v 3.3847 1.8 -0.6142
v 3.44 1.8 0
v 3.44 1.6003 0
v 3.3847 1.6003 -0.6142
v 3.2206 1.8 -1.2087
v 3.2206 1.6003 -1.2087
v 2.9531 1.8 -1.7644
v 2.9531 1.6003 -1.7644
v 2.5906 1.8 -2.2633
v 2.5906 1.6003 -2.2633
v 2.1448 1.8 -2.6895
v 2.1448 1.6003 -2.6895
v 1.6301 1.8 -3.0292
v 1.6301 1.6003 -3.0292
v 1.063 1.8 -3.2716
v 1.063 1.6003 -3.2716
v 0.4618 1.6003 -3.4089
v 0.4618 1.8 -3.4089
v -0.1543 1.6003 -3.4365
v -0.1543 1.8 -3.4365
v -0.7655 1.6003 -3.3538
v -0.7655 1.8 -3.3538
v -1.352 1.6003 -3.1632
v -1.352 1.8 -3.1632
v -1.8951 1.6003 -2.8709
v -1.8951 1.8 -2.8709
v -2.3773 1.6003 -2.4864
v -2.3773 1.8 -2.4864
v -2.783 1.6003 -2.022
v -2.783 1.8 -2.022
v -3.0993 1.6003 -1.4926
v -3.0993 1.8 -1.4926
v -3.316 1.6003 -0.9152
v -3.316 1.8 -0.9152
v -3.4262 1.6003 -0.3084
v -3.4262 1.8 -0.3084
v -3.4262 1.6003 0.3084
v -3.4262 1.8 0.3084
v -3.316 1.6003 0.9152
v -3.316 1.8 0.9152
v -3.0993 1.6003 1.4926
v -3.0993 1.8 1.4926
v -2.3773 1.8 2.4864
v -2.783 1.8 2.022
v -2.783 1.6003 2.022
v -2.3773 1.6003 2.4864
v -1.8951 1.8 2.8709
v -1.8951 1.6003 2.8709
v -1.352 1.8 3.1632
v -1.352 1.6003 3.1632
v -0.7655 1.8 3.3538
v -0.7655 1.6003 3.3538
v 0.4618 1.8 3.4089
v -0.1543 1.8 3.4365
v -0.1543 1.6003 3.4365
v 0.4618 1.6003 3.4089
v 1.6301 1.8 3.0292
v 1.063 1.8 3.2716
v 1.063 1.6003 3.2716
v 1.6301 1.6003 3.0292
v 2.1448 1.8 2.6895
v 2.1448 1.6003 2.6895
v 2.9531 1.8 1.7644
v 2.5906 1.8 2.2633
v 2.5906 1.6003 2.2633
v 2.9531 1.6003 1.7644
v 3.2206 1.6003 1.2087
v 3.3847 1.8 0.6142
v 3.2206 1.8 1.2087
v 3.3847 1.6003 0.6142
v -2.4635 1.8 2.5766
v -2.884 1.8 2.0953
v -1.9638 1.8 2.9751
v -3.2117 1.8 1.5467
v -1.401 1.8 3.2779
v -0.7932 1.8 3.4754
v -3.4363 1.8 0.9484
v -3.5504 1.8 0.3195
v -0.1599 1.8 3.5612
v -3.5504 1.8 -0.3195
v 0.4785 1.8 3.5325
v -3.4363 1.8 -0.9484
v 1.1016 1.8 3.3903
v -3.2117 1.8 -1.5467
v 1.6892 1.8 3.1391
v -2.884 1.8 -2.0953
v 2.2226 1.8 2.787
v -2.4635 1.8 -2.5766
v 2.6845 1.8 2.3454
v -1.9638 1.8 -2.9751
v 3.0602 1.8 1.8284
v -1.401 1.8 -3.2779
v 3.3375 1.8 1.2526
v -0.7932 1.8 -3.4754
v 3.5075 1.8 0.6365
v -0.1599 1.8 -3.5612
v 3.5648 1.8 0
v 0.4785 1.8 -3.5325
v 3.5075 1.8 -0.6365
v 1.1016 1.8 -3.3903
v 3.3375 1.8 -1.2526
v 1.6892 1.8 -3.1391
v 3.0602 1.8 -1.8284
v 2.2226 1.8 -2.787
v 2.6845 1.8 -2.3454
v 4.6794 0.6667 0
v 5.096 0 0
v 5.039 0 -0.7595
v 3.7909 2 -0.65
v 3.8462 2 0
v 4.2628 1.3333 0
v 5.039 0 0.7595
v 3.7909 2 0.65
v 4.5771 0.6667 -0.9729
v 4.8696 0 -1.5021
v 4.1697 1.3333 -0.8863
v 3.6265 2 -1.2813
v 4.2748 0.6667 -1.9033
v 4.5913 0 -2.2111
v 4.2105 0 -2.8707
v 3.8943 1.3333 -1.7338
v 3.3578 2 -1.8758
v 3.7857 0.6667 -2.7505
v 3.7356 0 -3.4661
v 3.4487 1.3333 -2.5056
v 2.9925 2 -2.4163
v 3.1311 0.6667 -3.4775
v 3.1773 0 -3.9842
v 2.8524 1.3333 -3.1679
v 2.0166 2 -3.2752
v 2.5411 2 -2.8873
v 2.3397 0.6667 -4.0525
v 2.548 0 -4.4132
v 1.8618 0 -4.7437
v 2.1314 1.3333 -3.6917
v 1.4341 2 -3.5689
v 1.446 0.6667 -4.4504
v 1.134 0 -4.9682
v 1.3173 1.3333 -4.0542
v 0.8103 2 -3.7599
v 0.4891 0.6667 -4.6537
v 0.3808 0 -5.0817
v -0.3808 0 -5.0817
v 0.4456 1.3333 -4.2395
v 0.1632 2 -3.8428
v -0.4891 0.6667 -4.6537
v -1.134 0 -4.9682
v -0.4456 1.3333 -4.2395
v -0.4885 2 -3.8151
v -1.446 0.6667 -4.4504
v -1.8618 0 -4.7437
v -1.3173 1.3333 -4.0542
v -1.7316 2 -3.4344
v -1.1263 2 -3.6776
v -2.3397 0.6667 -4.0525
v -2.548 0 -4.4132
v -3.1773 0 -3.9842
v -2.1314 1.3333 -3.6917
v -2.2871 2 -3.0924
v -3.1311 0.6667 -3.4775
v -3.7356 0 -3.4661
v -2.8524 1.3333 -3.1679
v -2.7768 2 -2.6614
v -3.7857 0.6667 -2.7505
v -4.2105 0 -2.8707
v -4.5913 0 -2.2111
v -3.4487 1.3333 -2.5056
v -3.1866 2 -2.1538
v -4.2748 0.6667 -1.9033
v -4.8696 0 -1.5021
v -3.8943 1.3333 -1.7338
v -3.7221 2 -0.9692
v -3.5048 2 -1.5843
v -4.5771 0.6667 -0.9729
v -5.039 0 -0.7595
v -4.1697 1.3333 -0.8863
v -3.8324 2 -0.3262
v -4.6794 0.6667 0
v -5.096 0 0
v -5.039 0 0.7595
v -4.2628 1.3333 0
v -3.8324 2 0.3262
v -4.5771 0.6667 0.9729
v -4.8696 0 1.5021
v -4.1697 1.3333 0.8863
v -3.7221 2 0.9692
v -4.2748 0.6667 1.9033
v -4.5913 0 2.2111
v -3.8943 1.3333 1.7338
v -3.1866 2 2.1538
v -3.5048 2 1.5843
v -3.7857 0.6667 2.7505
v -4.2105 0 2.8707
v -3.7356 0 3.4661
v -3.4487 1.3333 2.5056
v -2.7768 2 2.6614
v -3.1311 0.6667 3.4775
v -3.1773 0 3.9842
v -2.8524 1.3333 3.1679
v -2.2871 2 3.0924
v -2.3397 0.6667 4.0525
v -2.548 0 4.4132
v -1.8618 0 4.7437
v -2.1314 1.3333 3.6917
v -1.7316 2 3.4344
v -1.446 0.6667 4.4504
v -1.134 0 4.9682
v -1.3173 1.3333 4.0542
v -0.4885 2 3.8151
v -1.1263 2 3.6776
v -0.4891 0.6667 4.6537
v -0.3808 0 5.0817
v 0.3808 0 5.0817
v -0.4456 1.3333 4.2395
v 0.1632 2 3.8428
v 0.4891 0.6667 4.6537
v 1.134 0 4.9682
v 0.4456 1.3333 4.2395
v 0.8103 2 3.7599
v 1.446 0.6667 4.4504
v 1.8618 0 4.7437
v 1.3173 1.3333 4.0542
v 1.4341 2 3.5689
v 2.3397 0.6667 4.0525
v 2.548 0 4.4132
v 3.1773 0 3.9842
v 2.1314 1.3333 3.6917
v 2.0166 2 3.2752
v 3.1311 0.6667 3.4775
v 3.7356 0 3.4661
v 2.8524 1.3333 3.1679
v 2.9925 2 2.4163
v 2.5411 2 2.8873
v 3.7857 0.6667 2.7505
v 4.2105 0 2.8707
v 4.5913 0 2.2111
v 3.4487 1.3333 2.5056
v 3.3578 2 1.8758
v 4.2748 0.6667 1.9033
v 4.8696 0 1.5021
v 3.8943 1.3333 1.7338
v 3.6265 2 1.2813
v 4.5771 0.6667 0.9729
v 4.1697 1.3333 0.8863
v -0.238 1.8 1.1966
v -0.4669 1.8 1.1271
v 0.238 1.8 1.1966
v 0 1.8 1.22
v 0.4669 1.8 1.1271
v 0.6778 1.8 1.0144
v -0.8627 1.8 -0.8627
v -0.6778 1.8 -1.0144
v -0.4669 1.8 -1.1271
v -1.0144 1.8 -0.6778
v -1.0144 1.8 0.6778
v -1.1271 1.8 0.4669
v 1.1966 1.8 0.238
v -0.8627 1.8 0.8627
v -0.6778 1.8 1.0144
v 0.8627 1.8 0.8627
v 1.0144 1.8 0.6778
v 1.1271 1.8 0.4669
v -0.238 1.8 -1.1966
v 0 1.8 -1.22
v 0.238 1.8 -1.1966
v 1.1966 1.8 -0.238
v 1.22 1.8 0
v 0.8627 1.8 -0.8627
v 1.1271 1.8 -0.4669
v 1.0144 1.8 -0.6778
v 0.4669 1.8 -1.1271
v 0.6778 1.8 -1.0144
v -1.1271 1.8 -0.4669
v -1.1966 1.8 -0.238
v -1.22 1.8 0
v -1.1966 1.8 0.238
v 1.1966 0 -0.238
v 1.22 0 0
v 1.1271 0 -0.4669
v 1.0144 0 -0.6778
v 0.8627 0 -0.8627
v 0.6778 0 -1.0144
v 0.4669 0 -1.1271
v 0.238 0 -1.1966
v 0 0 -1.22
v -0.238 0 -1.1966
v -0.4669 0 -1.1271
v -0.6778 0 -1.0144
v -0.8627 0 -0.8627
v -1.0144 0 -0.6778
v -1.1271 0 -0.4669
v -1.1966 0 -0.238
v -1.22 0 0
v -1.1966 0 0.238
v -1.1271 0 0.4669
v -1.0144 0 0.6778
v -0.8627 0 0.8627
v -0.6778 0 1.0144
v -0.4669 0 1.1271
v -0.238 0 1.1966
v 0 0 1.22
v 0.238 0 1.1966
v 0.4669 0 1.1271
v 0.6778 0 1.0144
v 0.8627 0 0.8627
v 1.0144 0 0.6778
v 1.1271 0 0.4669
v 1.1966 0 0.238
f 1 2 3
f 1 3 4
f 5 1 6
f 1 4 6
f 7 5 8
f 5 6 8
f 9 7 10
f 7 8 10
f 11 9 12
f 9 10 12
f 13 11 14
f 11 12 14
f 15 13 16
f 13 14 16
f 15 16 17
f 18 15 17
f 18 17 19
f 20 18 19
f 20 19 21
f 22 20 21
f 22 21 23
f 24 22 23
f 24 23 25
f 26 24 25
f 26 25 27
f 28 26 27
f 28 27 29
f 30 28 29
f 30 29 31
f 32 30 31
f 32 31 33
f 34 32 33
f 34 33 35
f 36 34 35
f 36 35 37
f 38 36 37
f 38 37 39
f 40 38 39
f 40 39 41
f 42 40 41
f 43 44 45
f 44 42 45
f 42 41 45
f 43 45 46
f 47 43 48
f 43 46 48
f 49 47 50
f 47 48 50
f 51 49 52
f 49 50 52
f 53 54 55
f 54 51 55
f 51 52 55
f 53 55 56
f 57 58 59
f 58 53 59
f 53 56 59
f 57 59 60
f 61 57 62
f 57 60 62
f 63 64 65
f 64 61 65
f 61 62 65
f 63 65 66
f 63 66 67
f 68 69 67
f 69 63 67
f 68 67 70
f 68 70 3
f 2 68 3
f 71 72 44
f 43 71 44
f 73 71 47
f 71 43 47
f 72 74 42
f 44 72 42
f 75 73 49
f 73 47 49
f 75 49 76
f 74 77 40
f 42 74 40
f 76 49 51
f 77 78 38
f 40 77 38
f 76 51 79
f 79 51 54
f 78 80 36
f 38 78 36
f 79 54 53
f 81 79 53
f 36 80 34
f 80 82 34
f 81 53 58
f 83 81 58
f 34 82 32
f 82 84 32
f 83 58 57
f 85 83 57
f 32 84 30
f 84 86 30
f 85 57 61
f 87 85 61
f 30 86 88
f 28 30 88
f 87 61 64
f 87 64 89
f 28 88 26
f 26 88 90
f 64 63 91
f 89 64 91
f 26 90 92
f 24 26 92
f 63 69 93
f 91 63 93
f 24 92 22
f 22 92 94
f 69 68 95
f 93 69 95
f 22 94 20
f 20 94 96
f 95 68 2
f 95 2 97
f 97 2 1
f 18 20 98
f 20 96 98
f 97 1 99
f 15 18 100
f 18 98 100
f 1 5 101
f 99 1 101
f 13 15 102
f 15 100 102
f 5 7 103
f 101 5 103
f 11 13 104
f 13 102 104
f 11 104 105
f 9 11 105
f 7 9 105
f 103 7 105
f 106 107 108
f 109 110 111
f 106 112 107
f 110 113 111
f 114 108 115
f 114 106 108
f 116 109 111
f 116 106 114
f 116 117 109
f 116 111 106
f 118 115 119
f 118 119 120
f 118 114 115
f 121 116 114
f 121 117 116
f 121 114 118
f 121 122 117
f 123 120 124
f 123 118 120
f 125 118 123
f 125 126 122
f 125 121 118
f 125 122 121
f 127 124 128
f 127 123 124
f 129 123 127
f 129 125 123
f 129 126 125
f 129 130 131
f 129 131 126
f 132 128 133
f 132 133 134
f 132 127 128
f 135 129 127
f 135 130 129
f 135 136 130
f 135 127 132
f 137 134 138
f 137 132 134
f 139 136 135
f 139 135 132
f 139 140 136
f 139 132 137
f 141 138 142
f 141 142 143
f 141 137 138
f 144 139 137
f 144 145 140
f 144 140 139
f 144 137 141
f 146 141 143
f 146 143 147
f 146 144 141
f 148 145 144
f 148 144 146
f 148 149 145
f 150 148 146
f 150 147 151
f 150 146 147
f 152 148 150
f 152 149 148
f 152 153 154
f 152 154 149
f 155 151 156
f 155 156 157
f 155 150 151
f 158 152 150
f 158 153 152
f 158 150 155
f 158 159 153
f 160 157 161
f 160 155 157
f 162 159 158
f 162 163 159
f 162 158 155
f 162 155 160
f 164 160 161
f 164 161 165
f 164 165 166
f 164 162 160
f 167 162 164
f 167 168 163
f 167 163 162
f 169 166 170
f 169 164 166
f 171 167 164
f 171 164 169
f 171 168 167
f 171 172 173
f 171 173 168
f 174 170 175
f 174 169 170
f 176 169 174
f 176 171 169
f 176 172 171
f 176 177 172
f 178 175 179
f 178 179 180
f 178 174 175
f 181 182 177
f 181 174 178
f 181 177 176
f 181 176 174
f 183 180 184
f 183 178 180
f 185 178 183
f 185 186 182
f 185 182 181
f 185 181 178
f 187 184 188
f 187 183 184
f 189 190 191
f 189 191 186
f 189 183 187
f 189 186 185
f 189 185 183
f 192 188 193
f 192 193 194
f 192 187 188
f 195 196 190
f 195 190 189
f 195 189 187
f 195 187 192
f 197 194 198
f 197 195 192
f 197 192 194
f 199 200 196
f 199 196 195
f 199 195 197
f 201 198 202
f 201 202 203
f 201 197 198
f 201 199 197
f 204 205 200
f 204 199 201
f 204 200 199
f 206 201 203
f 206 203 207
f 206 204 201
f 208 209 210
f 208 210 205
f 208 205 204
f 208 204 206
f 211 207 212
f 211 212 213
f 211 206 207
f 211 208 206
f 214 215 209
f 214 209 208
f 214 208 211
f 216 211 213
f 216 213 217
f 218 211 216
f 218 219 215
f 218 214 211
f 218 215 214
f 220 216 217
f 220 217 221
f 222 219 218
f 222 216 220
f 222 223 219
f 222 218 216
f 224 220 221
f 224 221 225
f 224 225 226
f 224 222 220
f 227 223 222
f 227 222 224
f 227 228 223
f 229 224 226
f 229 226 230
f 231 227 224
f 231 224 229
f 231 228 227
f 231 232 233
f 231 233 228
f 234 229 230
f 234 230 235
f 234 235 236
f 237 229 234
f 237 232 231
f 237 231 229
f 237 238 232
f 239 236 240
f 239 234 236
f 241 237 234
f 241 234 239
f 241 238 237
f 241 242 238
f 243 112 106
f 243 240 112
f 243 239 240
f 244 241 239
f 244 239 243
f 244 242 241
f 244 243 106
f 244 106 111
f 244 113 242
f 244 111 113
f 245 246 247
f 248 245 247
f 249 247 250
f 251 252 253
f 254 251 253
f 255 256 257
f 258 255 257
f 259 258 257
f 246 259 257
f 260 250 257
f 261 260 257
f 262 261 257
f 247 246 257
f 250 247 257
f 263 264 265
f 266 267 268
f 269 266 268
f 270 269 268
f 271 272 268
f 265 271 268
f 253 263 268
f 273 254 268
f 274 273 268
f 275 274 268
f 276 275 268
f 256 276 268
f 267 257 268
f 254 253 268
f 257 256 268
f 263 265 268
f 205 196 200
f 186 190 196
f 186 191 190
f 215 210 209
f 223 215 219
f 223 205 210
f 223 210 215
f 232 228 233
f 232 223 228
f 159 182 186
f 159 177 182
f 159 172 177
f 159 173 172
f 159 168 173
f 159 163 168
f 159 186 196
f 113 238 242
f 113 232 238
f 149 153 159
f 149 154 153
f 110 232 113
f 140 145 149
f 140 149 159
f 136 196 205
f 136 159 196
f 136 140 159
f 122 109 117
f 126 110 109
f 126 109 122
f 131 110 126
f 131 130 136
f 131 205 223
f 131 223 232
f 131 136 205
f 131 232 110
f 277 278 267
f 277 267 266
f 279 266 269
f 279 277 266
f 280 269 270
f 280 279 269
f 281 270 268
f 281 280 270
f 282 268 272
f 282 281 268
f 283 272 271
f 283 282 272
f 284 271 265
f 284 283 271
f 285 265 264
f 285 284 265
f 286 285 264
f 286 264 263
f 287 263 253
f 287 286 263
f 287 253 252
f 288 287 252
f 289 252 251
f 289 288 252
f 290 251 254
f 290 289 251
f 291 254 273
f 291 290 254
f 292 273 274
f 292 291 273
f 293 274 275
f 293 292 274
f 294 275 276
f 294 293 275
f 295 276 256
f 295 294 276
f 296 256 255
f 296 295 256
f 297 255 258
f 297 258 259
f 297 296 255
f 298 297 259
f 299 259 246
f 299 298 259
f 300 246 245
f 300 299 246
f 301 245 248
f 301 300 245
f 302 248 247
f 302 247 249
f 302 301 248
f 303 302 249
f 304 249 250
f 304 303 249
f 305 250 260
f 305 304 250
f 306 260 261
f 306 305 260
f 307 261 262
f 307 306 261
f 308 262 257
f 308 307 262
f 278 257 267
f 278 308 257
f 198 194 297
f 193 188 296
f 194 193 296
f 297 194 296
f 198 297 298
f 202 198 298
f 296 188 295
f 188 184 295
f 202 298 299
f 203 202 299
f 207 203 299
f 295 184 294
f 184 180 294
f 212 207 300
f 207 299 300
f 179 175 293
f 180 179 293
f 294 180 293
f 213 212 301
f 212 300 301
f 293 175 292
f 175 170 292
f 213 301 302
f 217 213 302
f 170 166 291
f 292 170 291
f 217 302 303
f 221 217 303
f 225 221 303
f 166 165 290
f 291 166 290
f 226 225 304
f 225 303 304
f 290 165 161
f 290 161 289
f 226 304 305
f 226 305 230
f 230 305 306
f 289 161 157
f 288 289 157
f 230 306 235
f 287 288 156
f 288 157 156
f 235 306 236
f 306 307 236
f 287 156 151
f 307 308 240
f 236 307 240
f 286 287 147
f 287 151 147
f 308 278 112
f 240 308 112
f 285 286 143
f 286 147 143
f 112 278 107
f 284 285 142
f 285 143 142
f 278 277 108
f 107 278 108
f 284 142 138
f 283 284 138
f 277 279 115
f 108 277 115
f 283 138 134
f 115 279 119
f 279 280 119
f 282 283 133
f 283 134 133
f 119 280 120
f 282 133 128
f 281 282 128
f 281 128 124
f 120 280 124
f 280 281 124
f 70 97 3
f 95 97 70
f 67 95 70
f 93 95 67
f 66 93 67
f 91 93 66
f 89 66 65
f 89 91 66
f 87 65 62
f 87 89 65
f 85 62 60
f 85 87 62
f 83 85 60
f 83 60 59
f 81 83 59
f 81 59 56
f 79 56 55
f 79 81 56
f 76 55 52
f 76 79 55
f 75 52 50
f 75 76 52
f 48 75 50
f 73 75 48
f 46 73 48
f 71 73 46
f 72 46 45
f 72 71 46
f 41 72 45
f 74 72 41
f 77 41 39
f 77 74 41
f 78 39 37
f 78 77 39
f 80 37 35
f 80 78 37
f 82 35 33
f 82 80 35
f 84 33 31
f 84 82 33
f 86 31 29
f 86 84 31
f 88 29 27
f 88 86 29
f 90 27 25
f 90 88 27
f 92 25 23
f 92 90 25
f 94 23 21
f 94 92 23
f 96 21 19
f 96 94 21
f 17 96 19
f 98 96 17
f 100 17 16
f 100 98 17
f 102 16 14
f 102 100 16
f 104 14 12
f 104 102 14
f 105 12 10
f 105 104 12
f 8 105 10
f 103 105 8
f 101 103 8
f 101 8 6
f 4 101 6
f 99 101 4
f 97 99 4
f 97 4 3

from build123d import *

# Parameters (mm, degrees)
IZIM2_R                     = 5.095961834
IZIM2_R_2                   = 2.44
Y_KSEKLIK_EKSTR_ZYON1_DEPTH = 2
Y_KSEKLIK_EKSTR_ZYON1_TAPER = 32
IZIM3_R                     = 3.44
IZIM3_R_2                   = 2.44
EKSTR_ZYON_NCE1_DEPTH       = 2
IZIM4_R                     = 3.84622313
Y_KSEKLIK_EKSTR_ZYON2_DEPTH = 0.2
IZIM5_R                     = 2.44
IZIM5_R_2                   = 1.22
EKSTR_ZYON_NCE2_DEPTH       = 1.8


with BuildPart() as part:
    # Çizim2 → Yükseklik-Ekstrüzyon1 (new body)
    with BuildSketch(Plane(origin=(0, 0, 0), x_dir=(1, 0, 0), z_dir=(0, 1, 0))):
        Circle(IZIM2_R)
        Circle(IZIM2_R_2, mode=Mode.SUBTRACT)
    extrude(amount=Y_KSEKLIK_EKSTR_ZYON1_DEPTH, taper=Y_KSEKLIK_EKSTR_ZYON1_TAPER)

    # Çizim3 → Ekstrüzyon-İnce1 (add)
    with BuildSketch(Plane(origin=(0, 0, 0), x_dir=(1, 0, 0), z_dir=(0, 1, 0))):
        Circle(IZIM3_R)
        Circle(IZIM3_R_2, mode=Mode.SUBTRACT)
    extrude(amount=EKSTR_ZYON_NCE1_DEPTH)

    # Çizim4 → Yükseklik-Ekstrüzyon2 (add)
    with BuildSketch(Plane(origin=(0, 2, 0), x_dir=(1, 0, 0), z_dir=(0, 1, 0))):
        Circle(IZIM4_R)
    extrude(amount=-Y_KSEKLIK_EKSTR_ZYON2_DEPTH)

    # Çizim5 → Ekstrüzyon-İnce2 (add)
    with BuildSketch(Plane(origin=(0, 0, 0), x_dir=(1, 0, 0), z_dir=(0, 1, 0))):
        Circle(IZIM5_R)
        Circle(IZIM5_R_2, mode=Mode.SUBTRACT)
    extrude(amount=EKSTR_ZYON_NCE2_DEPTH)


solid = part.part
